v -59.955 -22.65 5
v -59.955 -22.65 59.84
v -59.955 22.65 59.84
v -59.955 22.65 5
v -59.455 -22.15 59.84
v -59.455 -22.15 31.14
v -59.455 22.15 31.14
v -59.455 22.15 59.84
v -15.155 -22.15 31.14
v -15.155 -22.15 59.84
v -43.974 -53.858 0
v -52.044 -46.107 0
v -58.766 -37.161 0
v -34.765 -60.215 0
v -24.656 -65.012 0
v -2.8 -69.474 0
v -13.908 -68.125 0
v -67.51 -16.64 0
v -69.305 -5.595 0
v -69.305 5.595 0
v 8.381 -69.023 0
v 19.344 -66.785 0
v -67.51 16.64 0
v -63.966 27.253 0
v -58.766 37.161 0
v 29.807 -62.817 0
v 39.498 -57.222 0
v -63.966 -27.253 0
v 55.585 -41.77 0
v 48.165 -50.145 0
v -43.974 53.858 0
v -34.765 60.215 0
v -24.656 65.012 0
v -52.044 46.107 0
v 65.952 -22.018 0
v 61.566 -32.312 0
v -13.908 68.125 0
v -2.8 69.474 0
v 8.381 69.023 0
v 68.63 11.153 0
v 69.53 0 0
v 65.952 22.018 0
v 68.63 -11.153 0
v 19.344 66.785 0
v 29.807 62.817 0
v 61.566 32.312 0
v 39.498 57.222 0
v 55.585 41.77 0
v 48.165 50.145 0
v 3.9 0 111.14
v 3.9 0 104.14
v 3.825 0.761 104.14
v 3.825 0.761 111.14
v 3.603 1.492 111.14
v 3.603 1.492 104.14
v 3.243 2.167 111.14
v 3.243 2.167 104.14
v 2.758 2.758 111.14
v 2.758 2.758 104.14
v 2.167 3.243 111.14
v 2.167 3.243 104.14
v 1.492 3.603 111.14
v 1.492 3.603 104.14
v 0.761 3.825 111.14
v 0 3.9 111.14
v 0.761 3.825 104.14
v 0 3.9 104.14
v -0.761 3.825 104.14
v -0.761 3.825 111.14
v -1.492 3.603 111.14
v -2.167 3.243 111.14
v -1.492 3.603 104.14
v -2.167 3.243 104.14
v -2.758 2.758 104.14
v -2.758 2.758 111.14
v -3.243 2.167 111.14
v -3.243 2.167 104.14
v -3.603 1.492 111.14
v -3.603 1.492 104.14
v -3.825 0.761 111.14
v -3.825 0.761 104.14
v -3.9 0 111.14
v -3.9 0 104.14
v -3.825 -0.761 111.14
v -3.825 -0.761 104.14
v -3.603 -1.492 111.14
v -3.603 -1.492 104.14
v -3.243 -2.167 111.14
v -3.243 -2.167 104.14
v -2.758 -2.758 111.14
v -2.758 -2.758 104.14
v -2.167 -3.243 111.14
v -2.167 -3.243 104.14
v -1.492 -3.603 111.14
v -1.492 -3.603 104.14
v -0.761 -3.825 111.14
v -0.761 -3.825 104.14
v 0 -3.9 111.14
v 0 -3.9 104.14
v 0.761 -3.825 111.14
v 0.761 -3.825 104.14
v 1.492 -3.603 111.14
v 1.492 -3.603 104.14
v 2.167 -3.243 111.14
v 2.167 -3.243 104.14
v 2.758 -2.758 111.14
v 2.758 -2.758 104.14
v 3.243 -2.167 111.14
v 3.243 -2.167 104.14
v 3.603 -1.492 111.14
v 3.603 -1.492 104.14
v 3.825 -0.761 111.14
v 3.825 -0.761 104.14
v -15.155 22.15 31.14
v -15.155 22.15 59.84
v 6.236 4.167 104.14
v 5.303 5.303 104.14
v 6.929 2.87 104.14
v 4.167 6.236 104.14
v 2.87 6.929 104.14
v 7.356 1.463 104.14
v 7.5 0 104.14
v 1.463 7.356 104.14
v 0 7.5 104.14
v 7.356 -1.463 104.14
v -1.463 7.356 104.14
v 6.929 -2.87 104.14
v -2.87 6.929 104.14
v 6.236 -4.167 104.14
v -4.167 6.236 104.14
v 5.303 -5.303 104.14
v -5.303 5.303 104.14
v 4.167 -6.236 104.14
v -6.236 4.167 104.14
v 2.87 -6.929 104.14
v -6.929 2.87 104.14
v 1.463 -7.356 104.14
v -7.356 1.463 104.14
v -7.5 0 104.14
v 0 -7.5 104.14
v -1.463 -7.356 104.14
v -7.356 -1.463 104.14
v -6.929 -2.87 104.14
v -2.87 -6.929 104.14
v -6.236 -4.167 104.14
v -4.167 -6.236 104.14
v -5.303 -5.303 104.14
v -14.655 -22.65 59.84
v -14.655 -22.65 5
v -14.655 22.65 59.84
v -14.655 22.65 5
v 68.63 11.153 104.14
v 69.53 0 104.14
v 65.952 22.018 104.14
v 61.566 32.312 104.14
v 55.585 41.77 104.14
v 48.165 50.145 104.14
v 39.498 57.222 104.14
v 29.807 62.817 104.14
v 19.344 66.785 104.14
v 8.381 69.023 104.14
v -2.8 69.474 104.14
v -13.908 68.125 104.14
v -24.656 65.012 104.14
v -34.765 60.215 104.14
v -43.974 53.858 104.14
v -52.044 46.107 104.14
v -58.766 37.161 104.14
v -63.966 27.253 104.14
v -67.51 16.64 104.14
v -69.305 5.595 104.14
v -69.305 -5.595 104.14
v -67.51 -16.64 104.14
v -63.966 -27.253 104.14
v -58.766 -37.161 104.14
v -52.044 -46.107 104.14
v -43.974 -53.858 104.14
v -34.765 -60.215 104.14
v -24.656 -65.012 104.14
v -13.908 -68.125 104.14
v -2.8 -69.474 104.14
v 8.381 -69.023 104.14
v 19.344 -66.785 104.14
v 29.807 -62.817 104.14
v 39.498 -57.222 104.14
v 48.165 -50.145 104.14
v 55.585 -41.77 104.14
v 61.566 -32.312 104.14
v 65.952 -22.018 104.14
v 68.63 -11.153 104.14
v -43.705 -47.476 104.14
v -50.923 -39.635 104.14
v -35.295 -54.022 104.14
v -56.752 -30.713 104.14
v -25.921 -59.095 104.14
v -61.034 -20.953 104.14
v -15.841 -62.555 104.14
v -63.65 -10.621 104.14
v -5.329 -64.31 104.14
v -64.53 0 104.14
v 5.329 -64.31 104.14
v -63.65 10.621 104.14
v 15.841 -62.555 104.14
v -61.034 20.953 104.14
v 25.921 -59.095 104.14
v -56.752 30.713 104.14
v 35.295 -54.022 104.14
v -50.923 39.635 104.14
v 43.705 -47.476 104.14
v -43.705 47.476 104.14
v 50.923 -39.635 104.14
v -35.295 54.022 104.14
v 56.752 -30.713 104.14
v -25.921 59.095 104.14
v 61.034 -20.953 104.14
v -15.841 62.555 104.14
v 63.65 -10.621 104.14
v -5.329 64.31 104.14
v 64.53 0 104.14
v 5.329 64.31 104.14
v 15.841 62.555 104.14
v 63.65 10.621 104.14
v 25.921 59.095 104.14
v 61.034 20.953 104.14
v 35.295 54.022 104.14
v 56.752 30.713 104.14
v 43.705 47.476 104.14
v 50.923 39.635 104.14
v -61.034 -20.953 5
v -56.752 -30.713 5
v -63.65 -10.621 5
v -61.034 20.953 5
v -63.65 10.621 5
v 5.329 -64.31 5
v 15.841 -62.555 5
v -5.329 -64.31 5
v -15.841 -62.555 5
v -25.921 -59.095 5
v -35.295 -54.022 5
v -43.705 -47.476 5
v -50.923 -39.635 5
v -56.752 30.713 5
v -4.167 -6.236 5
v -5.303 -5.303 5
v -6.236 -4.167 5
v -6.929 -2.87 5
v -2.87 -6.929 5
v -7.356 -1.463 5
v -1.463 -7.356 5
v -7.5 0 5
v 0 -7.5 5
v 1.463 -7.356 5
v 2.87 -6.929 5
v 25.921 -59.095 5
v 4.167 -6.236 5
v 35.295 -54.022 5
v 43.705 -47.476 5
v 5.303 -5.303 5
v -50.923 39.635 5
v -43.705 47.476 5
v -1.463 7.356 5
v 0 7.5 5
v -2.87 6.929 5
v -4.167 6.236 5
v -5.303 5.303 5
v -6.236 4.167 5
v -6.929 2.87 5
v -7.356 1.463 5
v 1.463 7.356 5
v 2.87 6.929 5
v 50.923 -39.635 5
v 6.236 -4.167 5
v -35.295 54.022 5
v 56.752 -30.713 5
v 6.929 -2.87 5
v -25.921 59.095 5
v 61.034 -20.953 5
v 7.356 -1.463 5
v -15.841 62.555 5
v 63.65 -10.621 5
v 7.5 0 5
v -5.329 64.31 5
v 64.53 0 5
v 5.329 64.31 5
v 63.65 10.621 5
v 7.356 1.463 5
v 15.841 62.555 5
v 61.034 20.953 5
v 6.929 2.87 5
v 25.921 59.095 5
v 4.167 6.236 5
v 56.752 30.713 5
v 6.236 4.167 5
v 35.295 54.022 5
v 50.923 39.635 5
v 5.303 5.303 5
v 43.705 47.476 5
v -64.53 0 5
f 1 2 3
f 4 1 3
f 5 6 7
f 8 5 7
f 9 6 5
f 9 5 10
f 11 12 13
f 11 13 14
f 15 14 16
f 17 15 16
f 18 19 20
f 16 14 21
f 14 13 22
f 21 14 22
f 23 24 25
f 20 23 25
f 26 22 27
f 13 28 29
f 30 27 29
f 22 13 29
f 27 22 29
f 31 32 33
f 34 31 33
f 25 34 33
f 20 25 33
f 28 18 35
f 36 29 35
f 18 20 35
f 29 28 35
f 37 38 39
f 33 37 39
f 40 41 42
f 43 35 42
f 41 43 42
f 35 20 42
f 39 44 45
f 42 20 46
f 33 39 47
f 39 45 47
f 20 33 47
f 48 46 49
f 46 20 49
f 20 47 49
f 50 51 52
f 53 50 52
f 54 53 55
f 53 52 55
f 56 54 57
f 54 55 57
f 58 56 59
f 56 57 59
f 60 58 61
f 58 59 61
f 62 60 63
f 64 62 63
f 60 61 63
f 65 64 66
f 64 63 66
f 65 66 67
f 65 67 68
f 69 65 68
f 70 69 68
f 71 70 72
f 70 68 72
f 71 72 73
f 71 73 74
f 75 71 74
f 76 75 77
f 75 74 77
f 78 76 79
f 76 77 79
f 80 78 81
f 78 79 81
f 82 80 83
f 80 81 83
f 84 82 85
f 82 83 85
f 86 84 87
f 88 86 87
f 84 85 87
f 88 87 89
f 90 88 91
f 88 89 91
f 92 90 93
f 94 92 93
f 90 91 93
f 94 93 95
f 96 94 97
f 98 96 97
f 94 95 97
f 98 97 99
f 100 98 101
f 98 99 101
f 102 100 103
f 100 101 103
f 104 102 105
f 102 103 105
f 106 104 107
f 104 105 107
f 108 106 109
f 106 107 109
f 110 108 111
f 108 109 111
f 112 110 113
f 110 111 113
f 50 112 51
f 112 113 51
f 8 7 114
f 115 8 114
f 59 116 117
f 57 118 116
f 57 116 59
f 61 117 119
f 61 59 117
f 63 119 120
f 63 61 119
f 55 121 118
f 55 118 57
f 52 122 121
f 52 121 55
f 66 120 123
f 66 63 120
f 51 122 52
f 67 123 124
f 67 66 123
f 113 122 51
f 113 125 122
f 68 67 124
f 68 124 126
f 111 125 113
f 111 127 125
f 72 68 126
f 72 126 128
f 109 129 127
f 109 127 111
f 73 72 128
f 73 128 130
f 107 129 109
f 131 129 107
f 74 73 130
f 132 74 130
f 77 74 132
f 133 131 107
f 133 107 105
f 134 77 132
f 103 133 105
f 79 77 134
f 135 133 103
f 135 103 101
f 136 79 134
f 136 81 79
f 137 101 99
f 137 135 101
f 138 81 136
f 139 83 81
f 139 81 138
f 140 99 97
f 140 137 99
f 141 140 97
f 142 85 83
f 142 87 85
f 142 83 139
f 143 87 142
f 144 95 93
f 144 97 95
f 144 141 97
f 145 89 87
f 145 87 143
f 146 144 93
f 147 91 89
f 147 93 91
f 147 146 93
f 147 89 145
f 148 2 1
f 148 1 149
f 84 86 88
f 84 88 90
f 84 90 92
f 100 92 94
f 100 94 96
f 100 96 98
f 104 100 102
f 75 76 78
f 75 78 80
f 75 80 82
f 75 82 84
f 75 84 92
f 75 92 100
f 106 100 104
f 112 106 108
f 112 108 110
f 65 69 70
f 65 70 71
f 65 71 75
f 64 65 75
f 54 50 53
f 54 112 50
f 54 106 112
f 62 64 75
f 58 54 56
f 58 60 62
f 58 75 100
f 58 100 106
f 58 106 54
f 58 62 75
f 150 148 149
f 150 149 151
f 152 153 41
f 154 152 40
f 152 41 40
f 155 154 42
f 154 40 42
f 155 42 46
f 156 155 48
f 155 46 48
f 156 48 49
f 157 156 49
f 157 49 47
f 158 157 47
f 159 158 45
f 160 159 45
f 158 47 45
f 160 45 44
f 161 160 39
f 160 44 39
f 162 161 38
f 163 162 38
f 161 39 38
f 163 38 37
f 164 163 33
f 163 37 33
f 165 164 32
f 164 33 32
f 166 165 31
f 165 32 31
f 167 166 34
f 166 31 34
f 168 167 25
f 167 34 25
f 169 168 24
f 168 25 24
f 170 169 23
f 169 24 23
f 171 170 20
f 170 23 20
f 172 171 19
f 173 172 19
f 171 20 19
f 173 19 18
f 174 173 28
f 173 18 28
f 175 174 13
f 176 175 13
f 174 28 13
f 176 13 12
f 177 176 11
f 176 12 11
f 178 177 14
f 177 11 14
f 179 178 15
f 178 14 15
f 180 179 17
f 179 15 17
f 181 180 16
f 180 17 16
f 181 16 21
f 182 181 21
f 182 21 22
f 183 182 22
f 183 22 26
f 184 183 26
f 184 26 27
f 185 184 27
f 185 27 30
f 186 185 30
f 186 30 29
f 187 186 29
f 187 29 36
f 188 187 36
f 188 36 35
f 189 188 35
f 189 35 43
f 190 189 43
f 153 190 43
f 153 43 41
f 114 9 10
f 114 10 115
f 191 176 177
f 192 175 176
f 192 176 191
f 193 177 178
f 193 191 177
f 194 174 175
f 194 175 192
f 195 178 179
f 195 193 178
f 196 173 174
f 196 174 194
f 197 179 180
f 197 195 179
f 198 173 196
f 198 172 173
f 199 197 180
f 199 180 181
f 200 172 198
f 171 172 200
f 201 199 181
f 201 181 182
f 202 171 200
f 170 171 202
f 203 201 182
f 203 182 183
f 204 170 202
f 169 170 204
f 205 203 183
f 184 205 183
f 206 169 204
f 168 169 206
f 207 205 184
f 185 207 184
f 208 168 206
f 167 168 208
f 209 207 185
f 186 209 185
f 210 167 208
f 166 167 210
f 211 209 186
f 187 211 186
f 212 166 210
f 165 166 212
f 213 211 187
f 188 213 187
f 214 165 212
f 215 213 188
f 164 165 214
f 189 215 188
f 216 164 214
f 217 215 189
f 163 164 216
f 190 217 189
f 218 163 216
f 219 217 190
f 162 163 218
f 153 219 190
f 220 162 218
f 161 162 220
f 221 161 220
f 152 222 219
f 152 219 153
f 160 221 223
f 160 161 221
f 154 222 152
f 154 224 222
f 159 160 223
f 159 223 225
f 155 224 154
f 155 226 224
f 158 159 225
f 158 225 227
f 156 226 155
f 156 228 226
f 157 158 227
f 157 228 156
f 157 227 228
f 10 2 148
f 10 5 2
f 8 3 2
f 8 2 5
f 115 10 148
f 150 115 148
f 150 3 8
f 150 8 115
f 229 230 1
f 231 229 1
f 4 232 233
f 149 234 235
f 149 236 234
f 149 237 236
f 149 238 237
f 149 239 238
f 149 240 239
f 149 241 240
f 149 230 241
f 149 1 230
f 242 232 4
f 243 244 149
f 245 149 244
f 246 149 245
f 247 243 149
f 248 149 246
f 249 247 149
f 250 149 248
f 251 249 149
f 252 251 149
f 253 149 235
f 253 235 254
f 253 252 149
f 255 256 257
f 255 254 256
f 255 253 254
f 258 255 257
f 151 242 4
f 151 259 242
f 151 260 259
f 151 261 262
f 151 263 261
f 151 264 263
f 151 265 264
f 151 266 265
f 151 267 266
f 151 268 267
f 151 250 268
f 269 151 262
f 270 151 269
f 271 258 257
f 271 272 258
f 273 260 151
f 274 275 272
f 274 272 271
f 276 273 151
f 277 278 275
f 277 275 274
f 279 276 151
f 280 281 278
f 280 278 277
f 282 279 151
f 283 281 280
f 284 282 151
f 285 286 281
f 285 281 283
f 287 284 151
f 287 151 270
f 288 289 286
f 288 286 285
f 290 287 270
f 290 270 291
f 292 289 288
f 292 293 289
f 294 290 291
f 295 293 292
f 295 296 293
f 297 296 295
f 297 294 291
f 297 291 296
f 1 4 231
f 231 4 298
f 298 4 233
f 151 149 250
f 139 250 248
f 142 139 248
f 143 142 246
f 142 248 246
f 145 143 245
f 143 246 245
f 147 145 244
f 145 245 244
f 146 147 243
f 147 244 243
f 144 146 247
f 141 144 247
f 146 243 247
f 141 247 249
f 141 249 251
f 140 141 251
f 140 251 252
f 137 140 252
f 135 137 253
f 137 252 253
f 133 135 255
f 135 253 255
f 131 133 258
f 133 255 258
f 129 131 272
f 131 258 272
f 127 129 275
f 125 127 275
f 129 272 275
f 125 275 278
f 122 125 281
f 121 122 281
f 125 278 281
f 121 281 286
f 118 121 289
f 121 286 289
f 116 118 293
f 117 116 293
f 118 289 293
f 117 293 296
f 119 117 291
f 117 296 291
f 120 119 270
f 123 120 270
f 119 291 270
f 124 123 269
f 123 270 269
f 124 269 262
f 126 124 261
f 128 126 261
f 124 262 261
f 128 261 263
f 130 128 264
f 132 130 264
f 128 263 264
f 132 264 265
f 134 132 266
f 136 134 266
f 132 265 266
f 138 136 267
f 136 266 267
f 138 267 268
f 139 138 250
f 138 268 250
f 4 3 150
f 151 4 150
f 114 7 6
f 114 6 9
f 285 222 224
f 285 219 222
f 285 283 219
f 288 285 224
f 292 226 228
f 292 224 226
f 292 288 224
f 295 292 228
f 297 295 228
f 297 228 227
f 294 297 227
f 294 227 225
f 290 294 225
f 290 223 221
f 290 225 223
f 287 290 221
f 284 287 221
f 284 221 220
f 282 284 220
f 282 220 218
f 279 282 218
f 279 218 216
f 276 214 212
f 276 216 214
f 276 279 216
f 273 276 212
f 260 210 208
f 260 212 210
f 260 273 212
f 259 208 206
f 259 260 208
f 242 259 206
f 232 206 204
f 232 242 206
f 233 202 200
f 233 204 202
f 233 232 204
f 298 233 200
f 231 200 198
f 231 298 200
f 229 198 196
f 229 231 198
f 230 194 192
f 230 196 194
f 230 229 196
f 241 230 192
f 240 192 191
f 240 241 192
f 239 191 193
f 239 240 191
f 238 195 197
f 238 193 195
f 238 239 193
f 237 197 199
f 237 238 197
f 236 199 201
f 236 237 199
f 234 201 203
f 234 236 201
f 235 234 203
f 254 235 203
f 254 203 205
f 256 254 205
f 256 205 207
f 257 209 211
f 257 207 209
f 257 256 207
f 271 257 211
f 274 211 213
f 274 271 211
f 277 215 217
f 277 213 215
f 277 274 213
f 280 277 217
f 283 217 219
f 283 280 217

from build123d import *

# Parameters (mm, degrees)
SKETCH1_R                       = 69.53
SKETCH1_W                       = 42.3
SKETCH1_H                       = 42.3
BOSS_EXTRUDE1_DEPTH             = 104.14
SHELL1_T                        = -5
SKETCH1_4_W                     = 42.3
SKETCH1_4_H                     = 42.3
BOSS_EXTRUDE3_DEPTH             = 31.14
SKETCH2_W                       = 45.3
SKETCH2_H                       = 45.3
BOSS_EXTRUDE5_DEPTH             = 28.7
BOSS_EXTRUDE5_DIRECTION_2_REACH = 124.466
CUT_EXTRUDE1_START              = -28.7
SKETCH3_W                       = 44.3
SKETCH3_H                       = 44.3
CUT_EXTRUDE1_DEPTH              = 28.7
SKETCH4_R                       = 7.5
BOSS_EXTRUDE6_DEPTH             = 99.14
SKETCH5_R                       = 3.9
BOSS_EXTRUDE7_DEPTH             = 7


with BuildPart() as part:
    # Sketch1 → Boss-Extrude1 (new body)
    # profile 1 of 2: a face of its own
    with BuildSketch(Plane.XY):
        Circle(SKETCH1_R)
        with Locations((-37.305, 0)):
            Rectangle(SKETCH1_W, SKETCH1_H, mode=Mode.SUBTRACT)
    # profile 2 of 2: a face of its own
    with BuildSketch(Plane.XY):
        with Locations((-37.305, 0)):
            Rectangle(SKETCH1_W, SKETCH1_H)
    extrude(amount=BOSS_EXTRUDE1_DEPTH)

    # Shell1
    shell1_openings = [part.faces().sort_by_distance(p)[0] for p in [
        (0, 0, 104.14),
    ]]
    offset(amount=SHELL1_T, openings=shell1_openings, kind=Kind.INTERSECTION)

    # Sketch1<4> → Boss-Extrude3 (add)
    with BuildSketch(Plane.XY):
        with Locations((-37.305, 0)):
            Rectangle(SKETCH1_4_W, SKETCH1_4_H)
    extrude(amount=BOSS_EXTRUDE3_DEPTH)

    # Sketch2 → Boss-Extrude5 (add)
    with BuildSketch(Plane.XY.offset(31.14)):
        with Locations((-37.305, 0)):
            Rectangle(SKETCH2_W, SKETCH2_H)
        with BuildLine():
            Line((-58.455, -20.754129107), (-58.455, 20.754129107))
            ThreePointArc((-58.455, 20.754129107), (-58.384303073, 20.952184962), (-58.3129351, 21.15))
            Line((-58.3129351, 21.15), (-16.155, 21.15))
            Line((-16.155, 21.15), (-16.155, -21.15))
            Line((-16.155, -21.15), (-58.3129351, -21.15))
            ThreePointArc((-58.3129351, -21.15), (-58.384303073, -20.952184962), (-58.455, -20.754129107))
        make_face(mode=Mode.SUBTRACT)
    extrude(amount=BOSS_EXTRUDE5_DEPTH)

    # Sketch2 → Boss-Extrude5 direction 2 (add, up to next)
    with BuildSketch(Plane.XY.offset(31.14), mode=Mode.PRIVATE) as boss_extrude5_direction_2_sk1:
        with Locations((-37.305, 0)):
            Rectangle(SKETCH2_W, SKETCH2_H)
        with BuildLine():
            Line((-58.455, -20.754129107), (-58.455, 20.754129107))
            ThreePointArc((-58.455, 20.754129107), (-58.384303073, 20.952184962), (-58.3129351, 21.15))
            Line((-58.3129351, 21.15), (-16.155, 21.15))
            Line((-16.155, 21.15), (-16.155, -21.15))
            Line((-16.155, -21.15), (-58.3129351, -21.15))
            ThreePointArc((-58.3129351, -21.15), (-58.384303073, -20.952184962), (-58.455, -20.754129107))
        make_face(mode=Mode.SUBTRACT)
    boss_extrude5_direction_2_tool1 = extrude(boss_extrude5_direction_2_sk1.sketch, amount=-BOSS_EXTRUDE5_DIRECTION_2_REACH, mode=Mode.PRIVATE) - part.part
    add(boss_extrude5_direction_2_tool1.solids().sort_by_distance((-37.305, -22.009361, 31.14))[0])

    # Sketch3 → Cut-Extrude1 (cut)
    with BuildSketch(Plane.XY.offset(59.84).offset(CUT_EXTRUDE1_START)):
        with Locations((-37.305, 0)):
            Rectangle(SKETCH3_W, SKETCH3_H)
        with BuildLine():
            Line((-16.155, -21.15), (-58.3129351, -21.15))
            ThreePointArc((-58.3129351, -21.15), (-58.384303073, -20.952184962), (-58.455, -20.754129107))
            Line((-58.455, -20.754129107), (-58.455, 20.754129107))
            ThreePointArc((-58.455, 20.754129107), (-58.384303073, 20.952184962), (-58.3129351, 21.15))
            Line((-58.3129351, 21.15), (-16.155, 21.15))
            Line((-16.155, 21.15), (-16.155, -21.15))
        make_face(mode=Mode.SUBTRACT)
    extrude(amount=CUT_EXTRUDE1_DEPTH, mode=Mode.SUBTRACT)

    # Sketch4 → Boss-Extrude6 (add)
    with BuildSketch(Plane.XY.offset(5)):
        with Locations(Location((0, 0, 0), (0, 0, 180))):
            Circle(SKETCH4_R)
    extrude(amount=BOSS_EXTRUDE6_DEPTH)

    # Sketch5 → Boss-Extrude7 (add)
    with BuildSketch(Plane.XY.offset(104.14)):
        Circle(SKETCH5_R)
    extrude(amount=BOSS_EXTRUDE7_DEPTH)


solid = part.part
